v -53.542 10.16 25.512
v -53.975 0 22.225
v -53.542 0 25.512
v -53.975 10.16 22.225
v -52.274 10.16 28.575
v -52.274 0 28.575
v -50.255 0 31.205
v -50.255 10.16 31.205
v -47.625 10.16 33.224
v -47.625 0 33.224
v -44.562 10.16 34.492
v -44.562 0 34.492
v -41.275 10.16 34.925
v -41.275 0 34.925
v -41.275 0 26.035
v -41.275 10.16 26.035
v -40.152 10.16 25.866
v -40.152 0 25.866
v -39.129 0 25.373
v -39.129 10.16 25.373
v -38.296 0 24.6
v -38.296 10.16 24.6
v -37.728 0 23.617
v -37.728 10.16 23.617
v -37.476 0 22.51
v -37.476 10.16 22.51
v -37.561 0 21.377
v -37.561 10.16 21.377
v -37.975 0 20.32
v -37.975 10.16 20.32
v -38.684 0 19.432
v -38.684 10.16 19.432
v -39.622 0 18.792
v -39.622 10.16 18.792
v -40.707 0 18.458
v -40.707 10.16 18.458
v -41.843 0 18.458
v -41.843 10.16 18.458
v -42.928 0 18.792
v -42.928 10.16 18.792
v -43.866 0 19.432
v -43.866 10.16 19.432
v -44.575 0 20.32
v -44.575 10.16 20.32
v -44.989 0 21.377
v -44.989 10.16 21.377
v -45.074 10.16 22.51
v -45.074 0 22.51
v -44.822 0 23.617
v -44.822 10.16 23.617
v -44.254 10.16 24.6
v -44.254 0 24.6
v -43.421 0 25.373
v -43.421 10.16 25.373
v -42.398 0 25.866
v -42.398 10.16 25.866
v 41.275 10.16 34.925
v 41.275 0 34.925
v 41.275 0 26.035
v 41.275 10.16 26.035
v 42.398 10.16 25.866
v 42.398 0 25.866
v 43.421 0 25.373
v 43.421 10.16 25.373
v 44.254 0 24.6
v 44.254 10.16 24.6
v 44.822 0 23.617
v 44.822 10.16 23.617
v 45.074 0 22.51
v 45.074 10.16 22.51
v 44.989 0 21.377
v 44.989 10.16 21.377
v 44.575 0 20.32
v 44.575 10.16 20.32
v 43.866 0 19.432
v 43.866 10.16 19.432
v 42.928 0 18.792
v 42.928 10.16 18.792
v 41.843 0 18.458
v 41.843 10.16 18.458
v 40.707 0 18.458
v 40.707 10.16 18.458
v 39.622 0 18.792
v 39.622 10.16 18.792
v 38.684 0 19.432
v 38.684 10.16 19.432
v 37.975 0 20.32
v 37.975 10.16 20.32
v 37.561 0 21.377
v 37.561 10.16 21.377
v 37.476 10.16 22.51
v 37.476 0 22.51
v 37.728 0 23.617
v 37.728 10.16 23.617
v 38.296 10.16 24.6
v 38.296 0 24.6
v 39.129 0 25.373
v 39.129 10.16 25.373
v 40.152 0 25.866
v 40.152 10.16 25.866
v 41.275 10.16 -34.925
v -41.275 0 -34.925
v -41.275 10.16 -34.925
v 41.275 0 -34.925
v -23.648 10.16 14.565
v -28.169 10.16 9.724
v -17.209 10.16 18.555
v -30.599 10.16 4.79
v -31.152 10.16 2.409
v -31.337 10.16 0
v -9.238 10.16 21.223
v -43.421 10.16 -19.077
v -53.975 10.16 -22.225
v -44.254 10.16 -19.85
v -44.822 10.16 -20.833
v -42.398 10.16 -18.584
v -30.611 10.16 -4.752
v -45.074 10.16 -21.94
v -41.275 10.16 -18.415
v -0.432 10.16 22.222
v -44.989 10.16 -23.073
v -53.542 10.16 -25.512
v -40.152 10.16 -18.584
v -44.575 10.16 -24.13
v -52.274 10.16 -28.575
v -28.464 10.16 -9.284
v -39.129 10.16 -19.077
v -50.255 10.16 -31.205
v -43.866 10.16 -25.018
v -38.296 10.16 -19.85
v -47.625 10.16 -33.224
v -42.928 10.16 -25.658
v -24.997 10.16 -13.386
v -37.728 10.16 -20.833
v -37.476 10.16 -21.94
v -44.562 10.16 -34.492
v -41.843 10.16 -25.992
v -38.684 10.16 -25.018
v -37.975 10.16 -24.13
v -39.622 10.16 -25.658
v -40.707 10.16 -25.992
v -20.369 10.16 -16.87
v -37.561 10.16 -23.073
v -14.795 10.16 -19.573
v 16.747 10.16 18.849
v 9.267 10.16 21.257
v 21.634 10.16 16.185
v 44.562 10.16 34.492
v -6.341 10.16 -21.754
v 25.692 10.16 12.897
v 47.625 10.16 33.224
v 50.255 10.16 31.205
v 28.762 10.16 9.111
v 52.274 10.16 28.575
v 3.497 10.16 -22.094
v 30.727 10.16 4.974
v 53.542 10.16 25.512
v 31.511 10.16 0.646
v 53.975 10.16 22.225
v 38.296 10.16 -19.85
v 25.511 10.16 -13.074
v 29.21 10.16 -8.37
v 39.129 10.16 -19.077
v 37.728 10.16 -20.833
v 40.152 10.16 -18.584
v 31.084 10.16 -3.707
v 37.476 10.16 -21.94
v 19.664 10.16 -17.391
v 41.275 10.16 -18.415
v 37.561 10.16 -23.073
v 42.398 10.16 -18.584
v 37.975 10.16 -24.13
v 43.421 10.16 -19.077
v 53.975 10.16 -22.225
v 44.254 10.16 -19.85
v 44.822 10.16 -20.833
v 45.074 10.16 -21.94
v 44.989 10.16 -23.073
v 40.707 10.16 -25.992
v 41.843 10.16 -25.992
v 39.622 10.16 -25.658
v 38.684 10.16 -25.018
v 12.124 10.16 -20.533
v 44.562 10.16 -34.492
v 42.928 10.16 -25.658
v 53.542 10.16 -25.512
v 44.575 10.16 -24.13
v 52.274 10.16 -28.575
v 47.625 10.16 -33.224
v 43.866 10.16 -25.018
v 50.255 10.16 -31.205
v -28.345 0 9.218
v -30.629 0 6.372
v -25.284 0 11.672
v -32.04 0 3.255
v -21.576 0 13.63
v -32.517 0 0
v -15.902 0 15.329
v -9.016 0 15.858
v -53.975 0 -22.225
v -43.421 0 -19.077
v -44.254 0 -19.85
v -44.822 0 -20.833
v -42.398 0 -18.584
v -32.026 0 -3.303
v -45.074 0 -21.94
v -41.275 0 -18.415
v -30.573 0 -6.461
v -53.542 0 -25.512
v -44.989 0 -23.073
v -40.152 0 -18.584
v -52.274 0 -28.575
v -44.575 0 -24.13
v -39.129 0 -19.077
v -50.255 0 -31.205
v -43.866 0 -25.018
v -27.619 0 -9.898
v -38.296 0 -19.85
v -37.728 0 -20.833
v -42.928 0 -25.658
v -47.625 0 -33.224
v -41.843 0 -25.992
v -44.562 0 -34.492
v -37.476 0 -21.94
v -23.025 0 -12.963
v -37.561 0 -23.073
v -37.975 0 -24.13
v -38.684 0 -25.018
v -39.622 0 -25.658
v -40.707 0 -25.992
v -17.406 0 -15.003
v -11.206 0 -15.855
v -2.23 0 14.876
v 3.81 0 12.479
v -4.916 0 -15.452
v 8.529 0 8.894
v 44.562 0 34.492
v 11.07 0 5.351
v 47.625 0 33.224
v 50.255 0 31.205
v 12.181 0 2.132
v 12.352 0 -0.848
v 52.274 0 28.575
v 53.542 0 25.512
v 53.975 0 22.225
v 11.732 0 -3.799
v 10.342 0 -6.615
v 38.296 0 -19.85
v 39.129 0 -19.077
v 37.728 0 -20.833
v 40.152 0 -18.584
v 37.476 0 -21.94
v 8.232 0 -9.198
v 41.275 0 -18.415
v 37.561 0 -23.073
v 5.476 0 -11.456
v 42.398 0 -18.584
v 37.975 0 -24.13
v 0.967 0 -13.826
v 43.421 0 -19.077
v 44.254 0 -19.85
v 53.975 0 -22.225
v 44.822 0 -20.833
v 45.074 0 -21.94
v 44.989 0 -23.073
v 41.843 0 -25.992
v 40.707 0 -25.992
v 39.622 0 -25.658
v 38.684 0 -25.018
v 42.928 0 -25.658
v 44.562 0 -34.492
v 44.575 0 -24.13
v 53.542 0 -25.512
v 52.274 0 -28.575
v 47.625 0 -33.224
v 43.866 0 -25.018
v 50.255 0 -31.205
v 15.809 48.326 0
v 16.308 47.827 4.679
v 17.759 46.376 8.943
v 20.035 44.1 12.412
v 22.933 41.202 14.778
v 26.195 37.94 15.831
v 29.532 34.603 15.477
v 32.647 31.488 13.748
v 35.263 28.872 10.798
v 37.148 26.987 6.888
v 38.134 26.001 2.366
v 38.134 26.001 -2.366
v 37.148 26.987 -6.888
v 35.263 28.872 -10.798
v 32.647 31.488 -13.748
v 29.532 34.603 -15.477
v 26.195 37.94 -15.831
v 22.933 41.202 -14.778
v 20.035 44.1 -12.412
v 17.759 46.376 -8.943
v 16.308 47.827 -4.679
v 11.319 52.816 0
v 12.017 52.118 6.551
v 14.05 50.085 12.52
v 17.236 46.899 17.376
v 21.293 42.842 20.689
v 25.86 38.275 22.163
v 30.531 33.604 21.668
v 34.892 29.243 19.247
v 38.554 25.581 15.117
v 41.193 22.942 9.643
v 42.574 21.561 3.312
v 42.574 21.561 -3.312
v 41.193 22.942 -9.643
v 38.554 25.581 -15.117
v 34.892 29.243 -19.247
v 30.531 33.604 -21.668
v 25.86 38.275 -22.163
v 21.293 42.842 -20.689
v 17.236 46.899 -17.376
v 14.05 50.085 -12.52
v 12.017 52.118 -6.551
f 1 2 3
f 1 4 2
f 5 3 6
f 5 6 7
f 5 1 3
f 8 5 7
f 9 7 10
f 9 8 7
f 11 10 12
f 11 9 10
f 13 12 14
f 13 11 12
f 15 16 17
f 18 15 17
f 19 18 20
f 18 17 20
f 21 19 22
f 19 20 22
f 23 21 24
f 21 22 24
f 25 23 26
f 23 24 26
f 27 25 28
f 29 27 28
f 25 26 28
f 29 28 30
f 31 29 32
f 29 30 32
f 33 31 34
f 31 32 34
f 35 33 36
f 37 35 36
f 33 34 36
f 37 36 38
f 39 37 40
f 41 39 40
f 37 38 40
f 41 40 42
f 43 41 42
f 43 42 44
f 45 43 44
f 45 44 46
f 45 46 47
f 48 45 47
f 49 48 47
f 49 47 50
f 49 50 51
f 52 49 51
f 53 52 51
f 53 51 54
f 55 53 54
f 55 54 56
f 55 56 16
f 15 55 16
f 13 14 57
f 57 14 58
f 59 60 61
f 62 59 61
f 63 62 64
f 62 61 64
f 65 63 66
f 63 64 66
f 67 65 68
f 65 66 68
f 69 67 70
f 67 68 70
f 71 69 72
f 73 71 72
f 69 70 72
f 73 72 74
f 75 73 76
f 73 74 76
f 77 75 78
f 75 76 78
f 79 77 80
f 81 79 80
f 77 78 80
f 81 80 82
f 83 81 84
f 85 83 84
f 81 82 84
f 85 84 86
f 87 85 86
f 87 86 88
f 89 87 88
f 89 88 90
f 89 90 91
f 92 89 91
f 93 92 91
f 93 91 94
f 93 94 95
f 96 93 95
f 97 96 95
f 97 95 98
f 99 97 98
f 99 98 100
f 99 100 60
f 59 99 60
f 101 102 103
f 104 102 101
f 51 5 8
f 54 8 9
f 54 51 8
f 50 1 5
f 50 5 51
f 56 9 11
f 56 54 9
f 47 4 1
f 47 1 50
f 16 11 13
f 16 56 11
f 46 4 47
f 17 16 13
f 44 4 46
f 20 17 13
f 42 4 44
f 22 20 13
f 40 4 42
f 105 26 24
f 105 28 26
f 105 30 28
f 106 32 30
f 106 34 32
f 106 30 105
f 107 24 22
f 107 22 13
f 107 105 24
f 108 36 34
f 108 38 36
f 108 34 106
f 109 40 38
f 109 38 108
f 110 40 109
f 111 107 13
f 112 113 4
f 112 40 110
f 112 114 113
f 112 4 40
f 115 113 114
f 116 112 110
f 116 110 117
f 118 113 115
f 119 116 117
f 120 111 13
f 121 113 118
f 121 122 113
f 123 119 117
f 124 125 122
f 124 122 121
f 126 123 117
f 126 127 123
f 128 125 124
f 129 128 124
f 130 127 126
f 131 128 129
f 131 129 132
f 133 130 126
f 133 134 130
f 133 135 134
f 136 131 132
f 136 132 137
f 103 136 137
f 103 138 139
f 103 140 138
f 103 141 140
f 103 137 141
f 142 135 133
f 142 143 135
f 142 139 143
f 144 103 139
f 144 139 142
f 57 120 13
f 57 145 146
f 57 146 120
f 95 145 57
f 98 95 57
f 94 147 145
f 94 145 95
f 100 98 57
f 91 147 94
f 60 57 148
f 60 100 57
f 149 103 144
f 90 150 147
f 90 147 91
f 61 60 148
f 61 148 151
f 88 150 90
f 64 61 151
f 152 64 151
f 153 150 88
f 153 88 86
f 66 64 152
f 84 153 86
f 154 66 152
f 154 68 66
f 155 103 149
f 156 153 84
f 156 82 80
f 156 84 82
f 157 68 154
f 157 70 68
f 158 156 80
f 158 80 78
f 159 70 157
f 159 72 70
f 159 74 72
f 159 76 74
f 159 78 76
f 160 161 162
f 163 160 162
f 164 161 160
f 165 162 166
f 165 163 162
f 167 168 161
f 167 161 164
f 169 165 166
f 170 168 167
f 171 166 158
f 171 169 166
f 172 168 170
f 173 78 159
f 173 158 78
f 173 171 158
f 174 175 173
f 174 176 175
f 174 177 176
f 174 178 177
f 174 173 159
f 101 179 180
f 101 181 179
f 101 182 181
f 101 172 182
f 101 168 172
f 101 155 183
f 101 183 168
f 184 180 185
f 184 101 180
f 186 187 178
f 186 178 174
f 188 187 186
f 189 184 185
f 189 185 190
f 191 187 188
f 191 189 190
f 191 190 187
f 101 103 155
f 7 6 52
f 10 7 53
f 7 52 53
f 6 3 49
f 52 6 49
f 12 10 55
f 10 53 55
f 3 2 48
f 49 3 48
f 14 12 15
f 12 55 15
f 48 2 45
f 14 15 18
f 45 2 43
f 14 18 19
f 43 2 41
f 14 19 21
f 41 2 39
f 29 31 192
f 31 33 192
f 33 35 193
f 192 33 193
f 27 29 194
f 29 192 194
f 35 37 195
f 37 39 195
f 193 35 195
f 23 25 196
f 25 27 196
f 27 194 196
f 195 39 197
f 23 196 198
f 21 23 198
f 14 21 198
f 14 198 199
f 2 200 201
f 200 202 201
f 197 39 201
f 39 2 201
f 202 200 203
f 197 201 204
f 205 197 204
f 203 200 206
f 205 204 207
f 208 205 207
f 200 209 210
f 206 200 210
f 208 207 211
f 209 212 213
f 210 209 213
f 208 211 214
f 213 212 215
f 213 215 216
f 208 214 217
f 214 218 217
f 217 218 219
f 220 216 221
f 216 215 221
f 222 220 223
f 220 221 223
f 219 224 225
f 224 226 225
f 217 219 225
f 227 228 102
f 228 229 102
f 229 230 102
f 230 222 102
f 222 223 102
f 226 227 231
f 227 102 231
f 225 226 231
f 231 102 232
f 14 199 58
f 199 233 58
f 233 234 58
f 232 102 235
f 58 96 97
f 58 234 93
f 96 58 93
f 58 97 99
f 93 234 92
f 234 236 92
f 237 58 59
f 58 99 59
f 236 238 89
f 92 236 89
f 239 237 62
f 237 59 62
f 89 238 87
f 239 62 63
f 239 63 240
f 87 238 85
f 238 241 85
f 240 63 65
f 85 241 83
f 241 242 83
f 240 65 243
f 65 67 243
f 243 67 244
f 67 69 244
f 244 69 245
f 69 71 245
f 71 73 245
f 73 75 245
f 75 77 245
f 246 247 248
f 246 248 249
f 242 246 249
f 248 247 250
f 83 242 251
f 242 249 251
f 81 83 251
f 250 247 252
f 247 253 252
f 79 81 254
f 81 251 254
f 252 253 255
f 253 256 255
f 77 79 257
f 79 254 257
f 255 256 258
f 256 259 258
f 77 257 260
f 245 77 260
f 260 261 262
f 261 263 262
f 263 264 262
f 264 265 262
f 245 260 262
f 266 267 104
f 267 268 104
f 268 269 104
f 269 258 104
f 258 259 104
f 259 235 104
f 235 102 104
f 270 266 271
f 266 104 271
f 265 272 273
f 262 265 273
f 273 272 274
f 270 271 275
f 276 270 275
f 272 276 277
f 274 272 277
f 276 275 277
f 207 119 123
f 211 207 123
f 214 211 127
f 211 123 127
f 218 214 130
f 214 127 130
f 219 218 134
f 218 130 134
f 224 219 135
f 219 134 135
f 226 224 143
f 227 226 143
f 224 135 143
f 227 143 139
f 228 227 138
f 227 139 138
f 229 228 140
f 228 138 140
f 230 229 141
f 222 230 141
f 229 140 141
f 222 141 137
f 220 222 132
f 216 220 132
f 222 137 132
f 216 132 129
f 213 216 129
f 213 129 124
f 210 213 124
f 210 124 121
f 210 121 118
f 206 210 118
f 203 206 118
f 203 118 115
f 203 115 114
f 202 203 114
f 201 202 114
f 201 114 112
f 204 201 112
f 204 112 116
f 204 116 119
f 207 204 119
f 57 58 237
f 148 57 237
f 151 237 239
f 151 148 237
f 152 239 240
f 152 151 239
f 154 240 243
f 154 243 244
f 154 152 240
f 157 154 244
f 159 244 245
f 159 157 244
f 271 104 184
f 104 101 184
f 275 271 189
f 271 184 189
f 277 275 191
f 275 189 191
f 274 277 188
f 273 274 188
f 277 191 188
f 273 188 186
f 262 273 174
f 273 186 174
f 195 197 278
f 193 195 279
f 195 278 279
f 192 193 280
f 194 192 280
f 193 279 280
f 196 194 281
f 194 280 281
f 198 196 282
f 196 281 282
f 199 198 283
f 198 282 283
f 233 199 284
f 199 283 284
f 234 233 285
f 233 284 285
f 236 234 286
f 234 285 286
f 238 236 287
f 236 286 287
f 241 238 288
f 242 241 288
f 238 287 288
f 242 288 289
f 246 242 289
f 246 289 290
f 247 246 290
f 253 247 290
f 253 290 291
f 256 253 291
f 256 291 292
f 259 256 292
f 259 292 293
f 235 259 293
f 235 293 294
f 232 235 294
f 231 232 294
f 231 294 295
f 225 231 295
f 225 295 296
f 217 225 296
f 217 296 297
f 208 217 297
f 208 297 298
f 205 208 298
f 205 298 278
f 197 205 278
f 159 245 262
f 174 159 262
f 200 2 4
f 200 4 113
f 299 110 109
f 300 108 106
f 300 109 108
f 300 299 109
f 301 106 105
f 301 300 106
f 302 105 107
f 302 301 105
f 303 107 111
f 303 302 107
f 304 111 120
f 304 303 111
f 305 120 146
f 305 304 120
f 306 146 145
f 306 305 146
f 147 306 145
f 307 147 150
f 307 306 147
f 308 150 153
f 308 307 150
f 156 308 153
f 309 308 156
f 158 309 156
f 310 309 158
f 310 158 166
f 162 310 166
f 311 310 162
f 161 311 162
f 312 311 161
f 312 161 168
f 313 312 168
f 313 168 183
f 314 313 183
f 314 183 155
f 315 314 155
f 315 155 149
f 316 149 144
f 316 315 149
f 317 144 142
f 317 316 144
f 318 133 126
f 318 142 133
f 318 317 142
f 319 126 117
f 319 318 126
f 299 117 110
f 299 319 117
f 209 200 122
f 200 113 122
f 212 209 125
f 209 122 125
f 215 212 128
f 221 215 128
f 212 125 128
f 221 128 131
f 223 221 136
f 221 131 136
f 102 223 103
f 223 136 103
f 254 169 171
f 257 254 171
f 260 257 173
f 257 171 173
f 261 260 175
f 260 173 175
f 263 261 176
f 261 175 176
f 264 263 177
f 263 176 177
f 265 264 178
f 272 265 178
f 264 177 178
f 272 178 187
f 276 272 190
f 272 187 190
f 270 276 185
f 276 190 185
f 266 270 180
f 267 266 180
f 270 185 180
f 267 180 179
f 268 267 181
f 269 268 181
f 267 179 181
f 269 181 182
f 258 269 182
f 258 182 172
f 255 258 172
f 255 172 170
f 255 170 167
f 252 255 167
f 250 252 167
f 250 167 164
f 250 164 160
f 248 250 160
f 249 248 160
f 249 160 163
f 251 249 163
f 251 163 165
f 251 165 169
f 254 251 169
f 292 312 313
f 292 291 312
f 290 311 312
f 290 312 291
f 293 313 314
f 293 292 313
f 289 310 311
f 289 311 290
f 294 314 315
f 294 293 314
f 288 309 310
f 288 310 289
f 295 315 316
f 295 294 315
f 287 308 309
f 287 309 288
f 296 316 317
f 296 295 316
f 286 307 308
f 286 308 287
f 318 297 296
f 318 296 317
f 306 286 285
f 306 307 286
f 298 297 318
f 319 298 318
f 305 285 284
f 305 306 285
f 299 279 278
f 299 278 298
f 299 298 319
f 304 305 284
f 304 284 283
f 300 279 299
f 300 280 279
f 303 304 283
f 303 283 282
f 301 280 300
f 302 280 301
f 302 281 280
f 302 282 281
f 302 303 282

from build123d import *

# Parameters (mm, degrees)
SKETCH1_W            = 107.95
SKETCH1_H            = 69.85
BOSS_EXTRUDE1_DEPTH  = 10.16
SKETCH3_R            = 3.81
CUT_EXTRUDE1_DEPTH   = 66.086725605
LPATTERN1_COUNT      = 20
LPATTERN1_PITCH      = 82.55
LPATTERN1_COUNT_DIR2 = 2
LPATTERN1_PITCH_DIR2 = 44.45
FILLET1_R            = 12.7
BOSS_EXTRUDE2_REACH  = 100.241
SKETCH4_R            = 22.225
SKETCH5_R            = 15.875
CUT_EXTRUDE2_DEPTH   = 99.241498296


with BuildPart() as part:
    # Sketch1 → Boss-Extrude1 (new body)
    with BuildSketch(Plane(origin=(0, 0, 0), x_dir=(1, 0, 0), z_dir=(0, 1, 0))):
        Rectangle(SKETCH1_W, SKETCH1_H)
    extrude(amount=BOSS_EXTRUDE1_DEPTH)

    # Sketch3 → Cut-Extrude1 (cut, through all)
    with BuildSketch(Plane(origin=(0, 10.16, 0), x_dir=(1, 0, 0), z_dir=(0, 1, 0))):
        with Locations(Location((41.275, 22.225, 0), (0, 0, 270))):
            Circle(SKETCH3_R)
    cut_extrude1 = extrude(amount=-CUT_EXTRUDE1_DEPTH, mode=Mode.SUBTRACT)

    # LPattern1: Cut-Extrude1 20 × 2
    with Locations(*[(-i * LPATTERN1_PITCH, 0, j * LPATTERN1_PITCH_DIR2) for i in range(LPATTERN1_COUNT) for j in range(LPATTERN1_COUNT_DIR2) if (i, j) != (0, 0)]):
        add(cut_extrude1, mode=Mode.SUBTRACT)

    # Fillet1
    fillet1_edges = [part.edges().sort_by_distance(p)[0] for p in [
        (53.975, 5.08, 34.925),
        (-53.975, 5.08, 34.925),
        (-53.975, 5.08, -34.925),
        (53.975, 5.08, -34.925),
    ]]
    fillet(fillet1_edges, radius=FILLET1_R)

    # Boss-Extrude2: up to this plane
    boss_extrude2_end = Plane(origin=(0, 10.16, 0), z_dir=(0, -1, 0))
    # Sketch4 → Boss-Extrude2 (add, up to the surface)
    with BuildSketch(Plane(origin=(32.0675, 32.0675, 0), x_dir=(0, 0, -1), z_dir=(0.7071067811865488, 0.7071067811865464, 0)), mode=Mode.PRIVATE) as boss_extrude2_sk1:
        with Locations(Location((0, 7.118116382, 0), (0, 0, 90))):
            Circle(SKETCH4_R)
    boss_extrude2_tool1 = split(extrude(boss_extrude2_sk1.sketch, amount=-BOSS_EXTRUDE2_REACH, mode=Mode.PRIVATE), bisect_by=boss_extrude2_end, keep=Keep.BOTH, mode=Mode.PRIVATE)
    add(boss_extrude2_tool1.solids().sort_by_distance((27.034232, 37.100768, 0))[0])

    # Sketch5 → Cut-Extrude2 (cut, through all)
    with BuildSketch(Plane(origin=(32.0675, 32.0675, 0), x_dir=(0, 0, -1), z_dir=(0.7071067811865488, 0.7071067811865464, 0))):
        with Locations(Location((0, 7.118116382, 0), (0, 0, 90))):
            Circle(SKETCH5_R)
    extrude(amount=-CUT_EXTRUDE2_DEPTH, mode=Mode.SUBTRACT)


solid = part.part
